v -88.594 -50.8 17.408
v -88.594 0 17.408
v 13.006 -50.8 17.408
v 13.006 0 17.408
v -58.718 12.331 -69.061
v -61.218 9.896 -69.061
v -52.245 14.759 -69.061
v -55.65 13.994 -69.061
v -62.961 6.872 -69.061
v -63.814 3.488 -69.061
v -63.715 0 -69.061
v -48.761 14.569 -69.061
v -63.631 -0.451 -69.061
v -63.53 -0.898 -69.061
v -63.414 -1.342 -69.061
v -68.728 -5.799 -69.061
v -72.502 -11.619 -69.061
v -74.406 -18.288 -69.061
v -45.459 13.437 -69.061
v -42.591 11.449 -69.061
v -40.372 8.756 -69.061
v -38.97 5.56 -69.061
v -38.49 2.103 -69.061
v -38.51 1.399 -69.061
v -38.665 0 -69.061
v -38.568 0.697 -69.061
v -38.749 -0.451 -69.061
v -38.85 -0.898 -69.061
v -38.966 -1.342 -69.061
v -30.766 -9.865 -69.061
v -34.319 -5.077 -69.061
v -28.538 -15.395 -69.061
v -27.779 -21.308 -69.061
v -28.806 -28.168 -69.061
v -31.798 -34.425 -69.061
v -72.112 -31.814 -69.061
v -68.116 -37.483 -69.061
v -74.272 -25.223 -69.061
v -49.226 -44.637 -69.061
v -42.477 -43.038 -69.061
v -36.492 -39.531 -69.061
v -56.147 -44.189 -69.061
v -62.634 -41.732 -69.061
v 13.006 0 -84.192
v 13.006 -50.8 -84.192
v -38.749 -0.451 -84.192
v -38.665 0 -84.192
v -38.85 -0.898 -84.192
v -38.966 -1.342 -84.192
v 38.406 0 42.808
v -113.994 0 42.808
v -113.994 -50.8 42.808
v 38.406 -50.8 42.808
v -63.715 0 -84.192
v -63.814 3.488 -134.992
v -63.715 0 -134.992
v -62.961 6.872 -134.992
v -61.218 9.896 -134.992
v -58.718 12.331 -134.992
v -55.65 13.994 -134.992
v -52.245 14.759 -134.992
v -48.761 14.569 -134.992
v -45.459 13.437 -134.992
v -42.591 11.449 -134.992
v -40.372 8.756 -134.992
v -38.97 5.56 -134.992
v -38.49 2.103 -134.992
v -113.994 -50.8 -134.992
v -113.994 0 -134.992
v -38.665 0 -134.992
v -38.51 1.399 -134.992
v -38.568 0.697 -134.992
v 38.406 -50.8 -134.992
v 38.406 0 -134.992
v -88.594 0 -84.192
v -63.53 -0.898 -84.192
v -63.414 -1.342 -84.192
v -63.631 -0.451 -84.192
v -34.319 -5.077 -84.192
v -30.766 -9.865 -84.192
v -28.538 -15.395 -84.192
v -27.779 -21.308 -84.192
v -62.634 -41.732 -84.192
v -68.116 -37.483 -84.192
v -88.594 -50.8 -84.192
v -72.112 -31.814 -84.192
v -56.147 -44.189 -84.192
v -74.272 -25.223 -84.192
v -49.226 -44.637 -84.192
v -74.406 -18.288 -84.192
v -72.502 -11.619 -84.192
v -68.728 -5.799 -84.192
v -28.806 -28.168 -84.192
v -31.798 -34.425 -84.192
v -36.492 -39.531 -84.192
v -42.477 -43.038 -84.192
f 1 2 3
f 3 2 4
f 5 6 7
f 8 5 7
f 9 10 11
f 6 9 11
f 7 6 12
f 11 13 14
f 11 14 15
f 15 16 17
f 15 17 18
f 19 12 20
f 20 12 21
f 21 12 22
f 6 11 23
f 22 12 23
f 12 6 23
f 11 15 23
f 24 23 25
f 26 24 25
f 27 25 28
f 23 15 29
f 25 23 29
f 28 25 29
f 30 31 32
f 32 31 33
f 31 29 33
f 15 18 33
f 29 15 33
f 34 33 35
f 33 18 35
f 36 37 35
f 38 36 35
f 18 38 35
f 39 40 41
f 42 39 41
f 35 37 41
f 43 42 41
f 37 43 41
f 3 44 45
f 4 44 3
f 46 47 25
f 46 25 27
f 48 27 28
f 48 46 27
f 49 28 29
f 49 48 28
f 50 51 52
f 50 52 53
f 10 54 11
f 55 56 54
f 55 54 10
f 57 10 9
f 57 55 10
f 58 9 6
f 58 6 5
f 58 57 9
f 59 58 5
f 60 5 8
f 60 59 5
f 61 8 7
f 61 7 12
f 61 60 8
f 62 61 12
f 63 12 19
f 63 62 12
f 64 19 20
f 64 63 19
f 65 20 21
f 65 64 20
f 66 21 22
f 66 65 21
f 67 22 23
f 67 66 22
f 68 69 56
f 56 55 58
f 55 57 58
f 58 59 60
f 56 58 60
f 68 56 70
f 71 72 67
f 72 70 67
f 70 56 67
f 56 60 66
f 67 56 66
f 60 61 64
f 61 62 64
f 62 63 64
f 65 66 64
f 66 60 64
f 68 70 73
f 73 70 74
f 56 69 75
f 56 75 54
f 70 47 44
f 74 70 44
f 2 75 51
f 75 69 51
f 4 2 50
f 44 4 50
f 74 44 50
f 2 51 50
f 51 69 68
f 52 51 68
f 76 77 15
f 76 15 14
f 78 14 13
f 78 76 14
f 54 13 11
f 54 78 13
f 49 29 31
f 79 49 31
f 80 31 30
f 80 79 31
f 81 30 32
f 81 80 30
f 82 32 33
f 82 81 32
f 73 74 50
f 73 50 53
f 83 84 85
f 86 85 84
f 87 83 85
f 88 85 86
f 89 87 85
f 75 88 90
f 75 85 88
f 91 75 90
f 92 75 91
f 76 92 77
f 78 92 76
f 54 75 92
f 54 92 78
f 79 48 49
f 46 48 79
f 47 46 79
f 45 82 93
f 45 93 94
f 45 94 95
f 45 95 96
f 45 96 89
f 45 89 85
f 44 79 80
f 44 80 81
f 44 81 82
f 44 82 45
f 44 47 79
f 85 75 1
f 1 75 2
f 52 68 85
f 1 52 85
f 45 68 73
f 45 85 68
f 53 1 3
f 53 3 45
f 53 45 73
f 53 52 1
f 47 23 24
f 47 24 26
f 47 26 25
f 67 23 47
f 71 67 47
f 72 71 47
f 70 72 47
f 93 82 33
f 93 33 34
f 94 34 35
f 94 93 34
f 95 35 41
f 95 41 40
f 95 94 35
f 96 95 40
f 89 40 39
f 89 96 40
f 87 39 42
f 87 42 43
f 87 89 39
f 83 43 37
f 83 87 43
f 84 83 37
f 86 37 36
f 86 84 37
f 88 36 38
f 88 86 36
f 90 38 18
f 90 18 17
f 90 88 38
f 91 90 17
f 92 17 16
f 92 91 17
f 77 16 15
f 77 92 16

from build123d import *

# Parameters (mm, degrees)
F0_W         = 152.4
F0_H         = 152.4
F0_W_2       = 101.6
F0_H_2       = 101.6
F1_DEPTH     = 25.4
F2_W         = 152.4
F2_H         = 152.4
F2_W_2       = 101.6
F2_H_2       = 101.6
F1_FACE1_W   = 152.4
F1_FACE1_H   = 152.4
F1_FACE1_W_2 = 101.6
F1_FACE1_H_2 = 101.6
F3_DEPTH     = 25.4
F4_DEPTH     = 25.4
F6_DEPTH     = 65.9318938851


with BuildPart() as f1:
    # F0 (on Front) → F1 (new body)
    with BuildSketch(Plane.XZ):
        with Locations((-37.793815136, -33.3924548149)):
            Rectangle(F0_W, F0_H)
        with Locations((-37.793815136, -33.3924548149)):
            Rectangle(F0_W_2, F0_H_2, mode=Mode.SUBTRACT)
    extrude(amount=F1_DEPTH)

    # F2 (on face) + F1_face1 (on face) → F3 (join)
    with BuildSketch(Plane.XZ.offset(25.4)):
        with Locations((-37.793815136, -33.3924548149)):
            Rectangle(F2_W, F2_H)
        with Locations((-37.793815136, -33.3924548149)):
            Rectangle(F2_W_2, F2_H_2, mode=Mode.SUBTRACT)
    with BuildSketch(Plane(origin=(-37.793815136, 0, -33.3924548149), x_dir=(1, 0, 0), z_dir=(0, 1, 0))):
        Rectangle(F1_FACE1_W, F1_FACE1_H)
        Rectangle(F1_FACE1_W_2, F1_FACE1_H_2, mode=Mode.SUBTRACT)
    extrude(amount=F3_DEPTH, dir=(0, -1, 0))

    # F4 (add): a face of the model
    f4_faces = [f1.faces().sort_by_distance(p)[0] for p in [
        (-37.793815136, -25.4, -109.5924548149),
    ]]
    extrude(f4_faces, amount=F4_DEPTH)

    # F5 (on face) → F6 (join)
    with BuildSketch(Plane(origin=(0, 0, -134.9924548149), x_dir=(1, 0, 0), z_dir=(0, 0, -1))):
        with BuildLine():
            ThreePointArc((-38.6654032298, 0), (-38.7976029218, 0.6748576376), (-38.9661378476, 1.3415701457))
            ThreePointArc((-38.9661378476, 1.3415701457), (-40.2086037303, 0.632175677), (-41.4920817767, 0))
            Line((-41.4920817767, 0), (-38.6654032298, 0))
        make_face()
        with BuildLine():
            ThreePointArc((-38.9661378476, 1.3415701457), (-51.1900559068, 10.5968891325), (-63.4139739659, 1.3415701457))
            ThreePointArc((-63.4139739659, 1.3415701457), (-62.1715080832, 0.632175677), (-60.8880300369, 0))
            Line((-60.8880300369, 0), (-41.4920817767, 0))
            ThreePointArc((-41.4920817767, 0), (-40.2086037303, 0.632175677), (-38.9661378476, 1.3415701457))
        make_face()
        with BuildLine():
            ThreePointArc((-60.8880300369, 0), (-62.1715080832, 0.632175677), (-63.4139739659, 1.3415701457))
            ThreePointArc((-63.4139739659, 1.3415701457), (-63.5825088917, 0.6748576376), (-63.7147085837, 0))
            Line((-63.7147085837, 0), (-60.8880300369, 0))
        make_face()
        with BuildLine():
            ThreePointArc((-41.4920817767, 0), (-51.1900559068, -2.1031108675), (-60.8880300369, 0))
            Line((-60.8880300369, 0), (-63.7147085837, 0))
            ThreePointArc((-63.7147085837, 0), (-52.2452599161, -14.7591981183), (-38.4900559068, -2.1031108675))
            ThreePointArc((-38.4900559068, -2.1031108675), (-38.533968656, -1.0479068583), (-38.6654032298, 0))
            Line((-38.6654032298, 0), (-41.4920817767, 0))
        make_face()
        with BuildLine():
            Line((-41.4920817767, 0), (-60.8880300369, 0))
            ThreePointArc((-60.8880300369, 0), (-51.1900559068, -2.1031108675), (-41.4920817767, 0))
        make_face()
        with BuildLine():
            ThreePointArc((-38.9661378476, 1.3415701457), (-30.7660990603, 9.8646449948), (-27.7785993191, 21.3083457202))
            ThreePointArc((-27.7785993191, 21.3083457202), (-62.6337566322, 41.7323025666), (-63.4139739659, 1.3415701457))
            ThreePointArc((-63.4139739659, 1.3415701457), (-51.1900559068, 10.5968891325), (-38.9661378476, 1.3415701457))
        make_face()
    extrude(amount=-F6_DEPTH)


solid = f1.part
